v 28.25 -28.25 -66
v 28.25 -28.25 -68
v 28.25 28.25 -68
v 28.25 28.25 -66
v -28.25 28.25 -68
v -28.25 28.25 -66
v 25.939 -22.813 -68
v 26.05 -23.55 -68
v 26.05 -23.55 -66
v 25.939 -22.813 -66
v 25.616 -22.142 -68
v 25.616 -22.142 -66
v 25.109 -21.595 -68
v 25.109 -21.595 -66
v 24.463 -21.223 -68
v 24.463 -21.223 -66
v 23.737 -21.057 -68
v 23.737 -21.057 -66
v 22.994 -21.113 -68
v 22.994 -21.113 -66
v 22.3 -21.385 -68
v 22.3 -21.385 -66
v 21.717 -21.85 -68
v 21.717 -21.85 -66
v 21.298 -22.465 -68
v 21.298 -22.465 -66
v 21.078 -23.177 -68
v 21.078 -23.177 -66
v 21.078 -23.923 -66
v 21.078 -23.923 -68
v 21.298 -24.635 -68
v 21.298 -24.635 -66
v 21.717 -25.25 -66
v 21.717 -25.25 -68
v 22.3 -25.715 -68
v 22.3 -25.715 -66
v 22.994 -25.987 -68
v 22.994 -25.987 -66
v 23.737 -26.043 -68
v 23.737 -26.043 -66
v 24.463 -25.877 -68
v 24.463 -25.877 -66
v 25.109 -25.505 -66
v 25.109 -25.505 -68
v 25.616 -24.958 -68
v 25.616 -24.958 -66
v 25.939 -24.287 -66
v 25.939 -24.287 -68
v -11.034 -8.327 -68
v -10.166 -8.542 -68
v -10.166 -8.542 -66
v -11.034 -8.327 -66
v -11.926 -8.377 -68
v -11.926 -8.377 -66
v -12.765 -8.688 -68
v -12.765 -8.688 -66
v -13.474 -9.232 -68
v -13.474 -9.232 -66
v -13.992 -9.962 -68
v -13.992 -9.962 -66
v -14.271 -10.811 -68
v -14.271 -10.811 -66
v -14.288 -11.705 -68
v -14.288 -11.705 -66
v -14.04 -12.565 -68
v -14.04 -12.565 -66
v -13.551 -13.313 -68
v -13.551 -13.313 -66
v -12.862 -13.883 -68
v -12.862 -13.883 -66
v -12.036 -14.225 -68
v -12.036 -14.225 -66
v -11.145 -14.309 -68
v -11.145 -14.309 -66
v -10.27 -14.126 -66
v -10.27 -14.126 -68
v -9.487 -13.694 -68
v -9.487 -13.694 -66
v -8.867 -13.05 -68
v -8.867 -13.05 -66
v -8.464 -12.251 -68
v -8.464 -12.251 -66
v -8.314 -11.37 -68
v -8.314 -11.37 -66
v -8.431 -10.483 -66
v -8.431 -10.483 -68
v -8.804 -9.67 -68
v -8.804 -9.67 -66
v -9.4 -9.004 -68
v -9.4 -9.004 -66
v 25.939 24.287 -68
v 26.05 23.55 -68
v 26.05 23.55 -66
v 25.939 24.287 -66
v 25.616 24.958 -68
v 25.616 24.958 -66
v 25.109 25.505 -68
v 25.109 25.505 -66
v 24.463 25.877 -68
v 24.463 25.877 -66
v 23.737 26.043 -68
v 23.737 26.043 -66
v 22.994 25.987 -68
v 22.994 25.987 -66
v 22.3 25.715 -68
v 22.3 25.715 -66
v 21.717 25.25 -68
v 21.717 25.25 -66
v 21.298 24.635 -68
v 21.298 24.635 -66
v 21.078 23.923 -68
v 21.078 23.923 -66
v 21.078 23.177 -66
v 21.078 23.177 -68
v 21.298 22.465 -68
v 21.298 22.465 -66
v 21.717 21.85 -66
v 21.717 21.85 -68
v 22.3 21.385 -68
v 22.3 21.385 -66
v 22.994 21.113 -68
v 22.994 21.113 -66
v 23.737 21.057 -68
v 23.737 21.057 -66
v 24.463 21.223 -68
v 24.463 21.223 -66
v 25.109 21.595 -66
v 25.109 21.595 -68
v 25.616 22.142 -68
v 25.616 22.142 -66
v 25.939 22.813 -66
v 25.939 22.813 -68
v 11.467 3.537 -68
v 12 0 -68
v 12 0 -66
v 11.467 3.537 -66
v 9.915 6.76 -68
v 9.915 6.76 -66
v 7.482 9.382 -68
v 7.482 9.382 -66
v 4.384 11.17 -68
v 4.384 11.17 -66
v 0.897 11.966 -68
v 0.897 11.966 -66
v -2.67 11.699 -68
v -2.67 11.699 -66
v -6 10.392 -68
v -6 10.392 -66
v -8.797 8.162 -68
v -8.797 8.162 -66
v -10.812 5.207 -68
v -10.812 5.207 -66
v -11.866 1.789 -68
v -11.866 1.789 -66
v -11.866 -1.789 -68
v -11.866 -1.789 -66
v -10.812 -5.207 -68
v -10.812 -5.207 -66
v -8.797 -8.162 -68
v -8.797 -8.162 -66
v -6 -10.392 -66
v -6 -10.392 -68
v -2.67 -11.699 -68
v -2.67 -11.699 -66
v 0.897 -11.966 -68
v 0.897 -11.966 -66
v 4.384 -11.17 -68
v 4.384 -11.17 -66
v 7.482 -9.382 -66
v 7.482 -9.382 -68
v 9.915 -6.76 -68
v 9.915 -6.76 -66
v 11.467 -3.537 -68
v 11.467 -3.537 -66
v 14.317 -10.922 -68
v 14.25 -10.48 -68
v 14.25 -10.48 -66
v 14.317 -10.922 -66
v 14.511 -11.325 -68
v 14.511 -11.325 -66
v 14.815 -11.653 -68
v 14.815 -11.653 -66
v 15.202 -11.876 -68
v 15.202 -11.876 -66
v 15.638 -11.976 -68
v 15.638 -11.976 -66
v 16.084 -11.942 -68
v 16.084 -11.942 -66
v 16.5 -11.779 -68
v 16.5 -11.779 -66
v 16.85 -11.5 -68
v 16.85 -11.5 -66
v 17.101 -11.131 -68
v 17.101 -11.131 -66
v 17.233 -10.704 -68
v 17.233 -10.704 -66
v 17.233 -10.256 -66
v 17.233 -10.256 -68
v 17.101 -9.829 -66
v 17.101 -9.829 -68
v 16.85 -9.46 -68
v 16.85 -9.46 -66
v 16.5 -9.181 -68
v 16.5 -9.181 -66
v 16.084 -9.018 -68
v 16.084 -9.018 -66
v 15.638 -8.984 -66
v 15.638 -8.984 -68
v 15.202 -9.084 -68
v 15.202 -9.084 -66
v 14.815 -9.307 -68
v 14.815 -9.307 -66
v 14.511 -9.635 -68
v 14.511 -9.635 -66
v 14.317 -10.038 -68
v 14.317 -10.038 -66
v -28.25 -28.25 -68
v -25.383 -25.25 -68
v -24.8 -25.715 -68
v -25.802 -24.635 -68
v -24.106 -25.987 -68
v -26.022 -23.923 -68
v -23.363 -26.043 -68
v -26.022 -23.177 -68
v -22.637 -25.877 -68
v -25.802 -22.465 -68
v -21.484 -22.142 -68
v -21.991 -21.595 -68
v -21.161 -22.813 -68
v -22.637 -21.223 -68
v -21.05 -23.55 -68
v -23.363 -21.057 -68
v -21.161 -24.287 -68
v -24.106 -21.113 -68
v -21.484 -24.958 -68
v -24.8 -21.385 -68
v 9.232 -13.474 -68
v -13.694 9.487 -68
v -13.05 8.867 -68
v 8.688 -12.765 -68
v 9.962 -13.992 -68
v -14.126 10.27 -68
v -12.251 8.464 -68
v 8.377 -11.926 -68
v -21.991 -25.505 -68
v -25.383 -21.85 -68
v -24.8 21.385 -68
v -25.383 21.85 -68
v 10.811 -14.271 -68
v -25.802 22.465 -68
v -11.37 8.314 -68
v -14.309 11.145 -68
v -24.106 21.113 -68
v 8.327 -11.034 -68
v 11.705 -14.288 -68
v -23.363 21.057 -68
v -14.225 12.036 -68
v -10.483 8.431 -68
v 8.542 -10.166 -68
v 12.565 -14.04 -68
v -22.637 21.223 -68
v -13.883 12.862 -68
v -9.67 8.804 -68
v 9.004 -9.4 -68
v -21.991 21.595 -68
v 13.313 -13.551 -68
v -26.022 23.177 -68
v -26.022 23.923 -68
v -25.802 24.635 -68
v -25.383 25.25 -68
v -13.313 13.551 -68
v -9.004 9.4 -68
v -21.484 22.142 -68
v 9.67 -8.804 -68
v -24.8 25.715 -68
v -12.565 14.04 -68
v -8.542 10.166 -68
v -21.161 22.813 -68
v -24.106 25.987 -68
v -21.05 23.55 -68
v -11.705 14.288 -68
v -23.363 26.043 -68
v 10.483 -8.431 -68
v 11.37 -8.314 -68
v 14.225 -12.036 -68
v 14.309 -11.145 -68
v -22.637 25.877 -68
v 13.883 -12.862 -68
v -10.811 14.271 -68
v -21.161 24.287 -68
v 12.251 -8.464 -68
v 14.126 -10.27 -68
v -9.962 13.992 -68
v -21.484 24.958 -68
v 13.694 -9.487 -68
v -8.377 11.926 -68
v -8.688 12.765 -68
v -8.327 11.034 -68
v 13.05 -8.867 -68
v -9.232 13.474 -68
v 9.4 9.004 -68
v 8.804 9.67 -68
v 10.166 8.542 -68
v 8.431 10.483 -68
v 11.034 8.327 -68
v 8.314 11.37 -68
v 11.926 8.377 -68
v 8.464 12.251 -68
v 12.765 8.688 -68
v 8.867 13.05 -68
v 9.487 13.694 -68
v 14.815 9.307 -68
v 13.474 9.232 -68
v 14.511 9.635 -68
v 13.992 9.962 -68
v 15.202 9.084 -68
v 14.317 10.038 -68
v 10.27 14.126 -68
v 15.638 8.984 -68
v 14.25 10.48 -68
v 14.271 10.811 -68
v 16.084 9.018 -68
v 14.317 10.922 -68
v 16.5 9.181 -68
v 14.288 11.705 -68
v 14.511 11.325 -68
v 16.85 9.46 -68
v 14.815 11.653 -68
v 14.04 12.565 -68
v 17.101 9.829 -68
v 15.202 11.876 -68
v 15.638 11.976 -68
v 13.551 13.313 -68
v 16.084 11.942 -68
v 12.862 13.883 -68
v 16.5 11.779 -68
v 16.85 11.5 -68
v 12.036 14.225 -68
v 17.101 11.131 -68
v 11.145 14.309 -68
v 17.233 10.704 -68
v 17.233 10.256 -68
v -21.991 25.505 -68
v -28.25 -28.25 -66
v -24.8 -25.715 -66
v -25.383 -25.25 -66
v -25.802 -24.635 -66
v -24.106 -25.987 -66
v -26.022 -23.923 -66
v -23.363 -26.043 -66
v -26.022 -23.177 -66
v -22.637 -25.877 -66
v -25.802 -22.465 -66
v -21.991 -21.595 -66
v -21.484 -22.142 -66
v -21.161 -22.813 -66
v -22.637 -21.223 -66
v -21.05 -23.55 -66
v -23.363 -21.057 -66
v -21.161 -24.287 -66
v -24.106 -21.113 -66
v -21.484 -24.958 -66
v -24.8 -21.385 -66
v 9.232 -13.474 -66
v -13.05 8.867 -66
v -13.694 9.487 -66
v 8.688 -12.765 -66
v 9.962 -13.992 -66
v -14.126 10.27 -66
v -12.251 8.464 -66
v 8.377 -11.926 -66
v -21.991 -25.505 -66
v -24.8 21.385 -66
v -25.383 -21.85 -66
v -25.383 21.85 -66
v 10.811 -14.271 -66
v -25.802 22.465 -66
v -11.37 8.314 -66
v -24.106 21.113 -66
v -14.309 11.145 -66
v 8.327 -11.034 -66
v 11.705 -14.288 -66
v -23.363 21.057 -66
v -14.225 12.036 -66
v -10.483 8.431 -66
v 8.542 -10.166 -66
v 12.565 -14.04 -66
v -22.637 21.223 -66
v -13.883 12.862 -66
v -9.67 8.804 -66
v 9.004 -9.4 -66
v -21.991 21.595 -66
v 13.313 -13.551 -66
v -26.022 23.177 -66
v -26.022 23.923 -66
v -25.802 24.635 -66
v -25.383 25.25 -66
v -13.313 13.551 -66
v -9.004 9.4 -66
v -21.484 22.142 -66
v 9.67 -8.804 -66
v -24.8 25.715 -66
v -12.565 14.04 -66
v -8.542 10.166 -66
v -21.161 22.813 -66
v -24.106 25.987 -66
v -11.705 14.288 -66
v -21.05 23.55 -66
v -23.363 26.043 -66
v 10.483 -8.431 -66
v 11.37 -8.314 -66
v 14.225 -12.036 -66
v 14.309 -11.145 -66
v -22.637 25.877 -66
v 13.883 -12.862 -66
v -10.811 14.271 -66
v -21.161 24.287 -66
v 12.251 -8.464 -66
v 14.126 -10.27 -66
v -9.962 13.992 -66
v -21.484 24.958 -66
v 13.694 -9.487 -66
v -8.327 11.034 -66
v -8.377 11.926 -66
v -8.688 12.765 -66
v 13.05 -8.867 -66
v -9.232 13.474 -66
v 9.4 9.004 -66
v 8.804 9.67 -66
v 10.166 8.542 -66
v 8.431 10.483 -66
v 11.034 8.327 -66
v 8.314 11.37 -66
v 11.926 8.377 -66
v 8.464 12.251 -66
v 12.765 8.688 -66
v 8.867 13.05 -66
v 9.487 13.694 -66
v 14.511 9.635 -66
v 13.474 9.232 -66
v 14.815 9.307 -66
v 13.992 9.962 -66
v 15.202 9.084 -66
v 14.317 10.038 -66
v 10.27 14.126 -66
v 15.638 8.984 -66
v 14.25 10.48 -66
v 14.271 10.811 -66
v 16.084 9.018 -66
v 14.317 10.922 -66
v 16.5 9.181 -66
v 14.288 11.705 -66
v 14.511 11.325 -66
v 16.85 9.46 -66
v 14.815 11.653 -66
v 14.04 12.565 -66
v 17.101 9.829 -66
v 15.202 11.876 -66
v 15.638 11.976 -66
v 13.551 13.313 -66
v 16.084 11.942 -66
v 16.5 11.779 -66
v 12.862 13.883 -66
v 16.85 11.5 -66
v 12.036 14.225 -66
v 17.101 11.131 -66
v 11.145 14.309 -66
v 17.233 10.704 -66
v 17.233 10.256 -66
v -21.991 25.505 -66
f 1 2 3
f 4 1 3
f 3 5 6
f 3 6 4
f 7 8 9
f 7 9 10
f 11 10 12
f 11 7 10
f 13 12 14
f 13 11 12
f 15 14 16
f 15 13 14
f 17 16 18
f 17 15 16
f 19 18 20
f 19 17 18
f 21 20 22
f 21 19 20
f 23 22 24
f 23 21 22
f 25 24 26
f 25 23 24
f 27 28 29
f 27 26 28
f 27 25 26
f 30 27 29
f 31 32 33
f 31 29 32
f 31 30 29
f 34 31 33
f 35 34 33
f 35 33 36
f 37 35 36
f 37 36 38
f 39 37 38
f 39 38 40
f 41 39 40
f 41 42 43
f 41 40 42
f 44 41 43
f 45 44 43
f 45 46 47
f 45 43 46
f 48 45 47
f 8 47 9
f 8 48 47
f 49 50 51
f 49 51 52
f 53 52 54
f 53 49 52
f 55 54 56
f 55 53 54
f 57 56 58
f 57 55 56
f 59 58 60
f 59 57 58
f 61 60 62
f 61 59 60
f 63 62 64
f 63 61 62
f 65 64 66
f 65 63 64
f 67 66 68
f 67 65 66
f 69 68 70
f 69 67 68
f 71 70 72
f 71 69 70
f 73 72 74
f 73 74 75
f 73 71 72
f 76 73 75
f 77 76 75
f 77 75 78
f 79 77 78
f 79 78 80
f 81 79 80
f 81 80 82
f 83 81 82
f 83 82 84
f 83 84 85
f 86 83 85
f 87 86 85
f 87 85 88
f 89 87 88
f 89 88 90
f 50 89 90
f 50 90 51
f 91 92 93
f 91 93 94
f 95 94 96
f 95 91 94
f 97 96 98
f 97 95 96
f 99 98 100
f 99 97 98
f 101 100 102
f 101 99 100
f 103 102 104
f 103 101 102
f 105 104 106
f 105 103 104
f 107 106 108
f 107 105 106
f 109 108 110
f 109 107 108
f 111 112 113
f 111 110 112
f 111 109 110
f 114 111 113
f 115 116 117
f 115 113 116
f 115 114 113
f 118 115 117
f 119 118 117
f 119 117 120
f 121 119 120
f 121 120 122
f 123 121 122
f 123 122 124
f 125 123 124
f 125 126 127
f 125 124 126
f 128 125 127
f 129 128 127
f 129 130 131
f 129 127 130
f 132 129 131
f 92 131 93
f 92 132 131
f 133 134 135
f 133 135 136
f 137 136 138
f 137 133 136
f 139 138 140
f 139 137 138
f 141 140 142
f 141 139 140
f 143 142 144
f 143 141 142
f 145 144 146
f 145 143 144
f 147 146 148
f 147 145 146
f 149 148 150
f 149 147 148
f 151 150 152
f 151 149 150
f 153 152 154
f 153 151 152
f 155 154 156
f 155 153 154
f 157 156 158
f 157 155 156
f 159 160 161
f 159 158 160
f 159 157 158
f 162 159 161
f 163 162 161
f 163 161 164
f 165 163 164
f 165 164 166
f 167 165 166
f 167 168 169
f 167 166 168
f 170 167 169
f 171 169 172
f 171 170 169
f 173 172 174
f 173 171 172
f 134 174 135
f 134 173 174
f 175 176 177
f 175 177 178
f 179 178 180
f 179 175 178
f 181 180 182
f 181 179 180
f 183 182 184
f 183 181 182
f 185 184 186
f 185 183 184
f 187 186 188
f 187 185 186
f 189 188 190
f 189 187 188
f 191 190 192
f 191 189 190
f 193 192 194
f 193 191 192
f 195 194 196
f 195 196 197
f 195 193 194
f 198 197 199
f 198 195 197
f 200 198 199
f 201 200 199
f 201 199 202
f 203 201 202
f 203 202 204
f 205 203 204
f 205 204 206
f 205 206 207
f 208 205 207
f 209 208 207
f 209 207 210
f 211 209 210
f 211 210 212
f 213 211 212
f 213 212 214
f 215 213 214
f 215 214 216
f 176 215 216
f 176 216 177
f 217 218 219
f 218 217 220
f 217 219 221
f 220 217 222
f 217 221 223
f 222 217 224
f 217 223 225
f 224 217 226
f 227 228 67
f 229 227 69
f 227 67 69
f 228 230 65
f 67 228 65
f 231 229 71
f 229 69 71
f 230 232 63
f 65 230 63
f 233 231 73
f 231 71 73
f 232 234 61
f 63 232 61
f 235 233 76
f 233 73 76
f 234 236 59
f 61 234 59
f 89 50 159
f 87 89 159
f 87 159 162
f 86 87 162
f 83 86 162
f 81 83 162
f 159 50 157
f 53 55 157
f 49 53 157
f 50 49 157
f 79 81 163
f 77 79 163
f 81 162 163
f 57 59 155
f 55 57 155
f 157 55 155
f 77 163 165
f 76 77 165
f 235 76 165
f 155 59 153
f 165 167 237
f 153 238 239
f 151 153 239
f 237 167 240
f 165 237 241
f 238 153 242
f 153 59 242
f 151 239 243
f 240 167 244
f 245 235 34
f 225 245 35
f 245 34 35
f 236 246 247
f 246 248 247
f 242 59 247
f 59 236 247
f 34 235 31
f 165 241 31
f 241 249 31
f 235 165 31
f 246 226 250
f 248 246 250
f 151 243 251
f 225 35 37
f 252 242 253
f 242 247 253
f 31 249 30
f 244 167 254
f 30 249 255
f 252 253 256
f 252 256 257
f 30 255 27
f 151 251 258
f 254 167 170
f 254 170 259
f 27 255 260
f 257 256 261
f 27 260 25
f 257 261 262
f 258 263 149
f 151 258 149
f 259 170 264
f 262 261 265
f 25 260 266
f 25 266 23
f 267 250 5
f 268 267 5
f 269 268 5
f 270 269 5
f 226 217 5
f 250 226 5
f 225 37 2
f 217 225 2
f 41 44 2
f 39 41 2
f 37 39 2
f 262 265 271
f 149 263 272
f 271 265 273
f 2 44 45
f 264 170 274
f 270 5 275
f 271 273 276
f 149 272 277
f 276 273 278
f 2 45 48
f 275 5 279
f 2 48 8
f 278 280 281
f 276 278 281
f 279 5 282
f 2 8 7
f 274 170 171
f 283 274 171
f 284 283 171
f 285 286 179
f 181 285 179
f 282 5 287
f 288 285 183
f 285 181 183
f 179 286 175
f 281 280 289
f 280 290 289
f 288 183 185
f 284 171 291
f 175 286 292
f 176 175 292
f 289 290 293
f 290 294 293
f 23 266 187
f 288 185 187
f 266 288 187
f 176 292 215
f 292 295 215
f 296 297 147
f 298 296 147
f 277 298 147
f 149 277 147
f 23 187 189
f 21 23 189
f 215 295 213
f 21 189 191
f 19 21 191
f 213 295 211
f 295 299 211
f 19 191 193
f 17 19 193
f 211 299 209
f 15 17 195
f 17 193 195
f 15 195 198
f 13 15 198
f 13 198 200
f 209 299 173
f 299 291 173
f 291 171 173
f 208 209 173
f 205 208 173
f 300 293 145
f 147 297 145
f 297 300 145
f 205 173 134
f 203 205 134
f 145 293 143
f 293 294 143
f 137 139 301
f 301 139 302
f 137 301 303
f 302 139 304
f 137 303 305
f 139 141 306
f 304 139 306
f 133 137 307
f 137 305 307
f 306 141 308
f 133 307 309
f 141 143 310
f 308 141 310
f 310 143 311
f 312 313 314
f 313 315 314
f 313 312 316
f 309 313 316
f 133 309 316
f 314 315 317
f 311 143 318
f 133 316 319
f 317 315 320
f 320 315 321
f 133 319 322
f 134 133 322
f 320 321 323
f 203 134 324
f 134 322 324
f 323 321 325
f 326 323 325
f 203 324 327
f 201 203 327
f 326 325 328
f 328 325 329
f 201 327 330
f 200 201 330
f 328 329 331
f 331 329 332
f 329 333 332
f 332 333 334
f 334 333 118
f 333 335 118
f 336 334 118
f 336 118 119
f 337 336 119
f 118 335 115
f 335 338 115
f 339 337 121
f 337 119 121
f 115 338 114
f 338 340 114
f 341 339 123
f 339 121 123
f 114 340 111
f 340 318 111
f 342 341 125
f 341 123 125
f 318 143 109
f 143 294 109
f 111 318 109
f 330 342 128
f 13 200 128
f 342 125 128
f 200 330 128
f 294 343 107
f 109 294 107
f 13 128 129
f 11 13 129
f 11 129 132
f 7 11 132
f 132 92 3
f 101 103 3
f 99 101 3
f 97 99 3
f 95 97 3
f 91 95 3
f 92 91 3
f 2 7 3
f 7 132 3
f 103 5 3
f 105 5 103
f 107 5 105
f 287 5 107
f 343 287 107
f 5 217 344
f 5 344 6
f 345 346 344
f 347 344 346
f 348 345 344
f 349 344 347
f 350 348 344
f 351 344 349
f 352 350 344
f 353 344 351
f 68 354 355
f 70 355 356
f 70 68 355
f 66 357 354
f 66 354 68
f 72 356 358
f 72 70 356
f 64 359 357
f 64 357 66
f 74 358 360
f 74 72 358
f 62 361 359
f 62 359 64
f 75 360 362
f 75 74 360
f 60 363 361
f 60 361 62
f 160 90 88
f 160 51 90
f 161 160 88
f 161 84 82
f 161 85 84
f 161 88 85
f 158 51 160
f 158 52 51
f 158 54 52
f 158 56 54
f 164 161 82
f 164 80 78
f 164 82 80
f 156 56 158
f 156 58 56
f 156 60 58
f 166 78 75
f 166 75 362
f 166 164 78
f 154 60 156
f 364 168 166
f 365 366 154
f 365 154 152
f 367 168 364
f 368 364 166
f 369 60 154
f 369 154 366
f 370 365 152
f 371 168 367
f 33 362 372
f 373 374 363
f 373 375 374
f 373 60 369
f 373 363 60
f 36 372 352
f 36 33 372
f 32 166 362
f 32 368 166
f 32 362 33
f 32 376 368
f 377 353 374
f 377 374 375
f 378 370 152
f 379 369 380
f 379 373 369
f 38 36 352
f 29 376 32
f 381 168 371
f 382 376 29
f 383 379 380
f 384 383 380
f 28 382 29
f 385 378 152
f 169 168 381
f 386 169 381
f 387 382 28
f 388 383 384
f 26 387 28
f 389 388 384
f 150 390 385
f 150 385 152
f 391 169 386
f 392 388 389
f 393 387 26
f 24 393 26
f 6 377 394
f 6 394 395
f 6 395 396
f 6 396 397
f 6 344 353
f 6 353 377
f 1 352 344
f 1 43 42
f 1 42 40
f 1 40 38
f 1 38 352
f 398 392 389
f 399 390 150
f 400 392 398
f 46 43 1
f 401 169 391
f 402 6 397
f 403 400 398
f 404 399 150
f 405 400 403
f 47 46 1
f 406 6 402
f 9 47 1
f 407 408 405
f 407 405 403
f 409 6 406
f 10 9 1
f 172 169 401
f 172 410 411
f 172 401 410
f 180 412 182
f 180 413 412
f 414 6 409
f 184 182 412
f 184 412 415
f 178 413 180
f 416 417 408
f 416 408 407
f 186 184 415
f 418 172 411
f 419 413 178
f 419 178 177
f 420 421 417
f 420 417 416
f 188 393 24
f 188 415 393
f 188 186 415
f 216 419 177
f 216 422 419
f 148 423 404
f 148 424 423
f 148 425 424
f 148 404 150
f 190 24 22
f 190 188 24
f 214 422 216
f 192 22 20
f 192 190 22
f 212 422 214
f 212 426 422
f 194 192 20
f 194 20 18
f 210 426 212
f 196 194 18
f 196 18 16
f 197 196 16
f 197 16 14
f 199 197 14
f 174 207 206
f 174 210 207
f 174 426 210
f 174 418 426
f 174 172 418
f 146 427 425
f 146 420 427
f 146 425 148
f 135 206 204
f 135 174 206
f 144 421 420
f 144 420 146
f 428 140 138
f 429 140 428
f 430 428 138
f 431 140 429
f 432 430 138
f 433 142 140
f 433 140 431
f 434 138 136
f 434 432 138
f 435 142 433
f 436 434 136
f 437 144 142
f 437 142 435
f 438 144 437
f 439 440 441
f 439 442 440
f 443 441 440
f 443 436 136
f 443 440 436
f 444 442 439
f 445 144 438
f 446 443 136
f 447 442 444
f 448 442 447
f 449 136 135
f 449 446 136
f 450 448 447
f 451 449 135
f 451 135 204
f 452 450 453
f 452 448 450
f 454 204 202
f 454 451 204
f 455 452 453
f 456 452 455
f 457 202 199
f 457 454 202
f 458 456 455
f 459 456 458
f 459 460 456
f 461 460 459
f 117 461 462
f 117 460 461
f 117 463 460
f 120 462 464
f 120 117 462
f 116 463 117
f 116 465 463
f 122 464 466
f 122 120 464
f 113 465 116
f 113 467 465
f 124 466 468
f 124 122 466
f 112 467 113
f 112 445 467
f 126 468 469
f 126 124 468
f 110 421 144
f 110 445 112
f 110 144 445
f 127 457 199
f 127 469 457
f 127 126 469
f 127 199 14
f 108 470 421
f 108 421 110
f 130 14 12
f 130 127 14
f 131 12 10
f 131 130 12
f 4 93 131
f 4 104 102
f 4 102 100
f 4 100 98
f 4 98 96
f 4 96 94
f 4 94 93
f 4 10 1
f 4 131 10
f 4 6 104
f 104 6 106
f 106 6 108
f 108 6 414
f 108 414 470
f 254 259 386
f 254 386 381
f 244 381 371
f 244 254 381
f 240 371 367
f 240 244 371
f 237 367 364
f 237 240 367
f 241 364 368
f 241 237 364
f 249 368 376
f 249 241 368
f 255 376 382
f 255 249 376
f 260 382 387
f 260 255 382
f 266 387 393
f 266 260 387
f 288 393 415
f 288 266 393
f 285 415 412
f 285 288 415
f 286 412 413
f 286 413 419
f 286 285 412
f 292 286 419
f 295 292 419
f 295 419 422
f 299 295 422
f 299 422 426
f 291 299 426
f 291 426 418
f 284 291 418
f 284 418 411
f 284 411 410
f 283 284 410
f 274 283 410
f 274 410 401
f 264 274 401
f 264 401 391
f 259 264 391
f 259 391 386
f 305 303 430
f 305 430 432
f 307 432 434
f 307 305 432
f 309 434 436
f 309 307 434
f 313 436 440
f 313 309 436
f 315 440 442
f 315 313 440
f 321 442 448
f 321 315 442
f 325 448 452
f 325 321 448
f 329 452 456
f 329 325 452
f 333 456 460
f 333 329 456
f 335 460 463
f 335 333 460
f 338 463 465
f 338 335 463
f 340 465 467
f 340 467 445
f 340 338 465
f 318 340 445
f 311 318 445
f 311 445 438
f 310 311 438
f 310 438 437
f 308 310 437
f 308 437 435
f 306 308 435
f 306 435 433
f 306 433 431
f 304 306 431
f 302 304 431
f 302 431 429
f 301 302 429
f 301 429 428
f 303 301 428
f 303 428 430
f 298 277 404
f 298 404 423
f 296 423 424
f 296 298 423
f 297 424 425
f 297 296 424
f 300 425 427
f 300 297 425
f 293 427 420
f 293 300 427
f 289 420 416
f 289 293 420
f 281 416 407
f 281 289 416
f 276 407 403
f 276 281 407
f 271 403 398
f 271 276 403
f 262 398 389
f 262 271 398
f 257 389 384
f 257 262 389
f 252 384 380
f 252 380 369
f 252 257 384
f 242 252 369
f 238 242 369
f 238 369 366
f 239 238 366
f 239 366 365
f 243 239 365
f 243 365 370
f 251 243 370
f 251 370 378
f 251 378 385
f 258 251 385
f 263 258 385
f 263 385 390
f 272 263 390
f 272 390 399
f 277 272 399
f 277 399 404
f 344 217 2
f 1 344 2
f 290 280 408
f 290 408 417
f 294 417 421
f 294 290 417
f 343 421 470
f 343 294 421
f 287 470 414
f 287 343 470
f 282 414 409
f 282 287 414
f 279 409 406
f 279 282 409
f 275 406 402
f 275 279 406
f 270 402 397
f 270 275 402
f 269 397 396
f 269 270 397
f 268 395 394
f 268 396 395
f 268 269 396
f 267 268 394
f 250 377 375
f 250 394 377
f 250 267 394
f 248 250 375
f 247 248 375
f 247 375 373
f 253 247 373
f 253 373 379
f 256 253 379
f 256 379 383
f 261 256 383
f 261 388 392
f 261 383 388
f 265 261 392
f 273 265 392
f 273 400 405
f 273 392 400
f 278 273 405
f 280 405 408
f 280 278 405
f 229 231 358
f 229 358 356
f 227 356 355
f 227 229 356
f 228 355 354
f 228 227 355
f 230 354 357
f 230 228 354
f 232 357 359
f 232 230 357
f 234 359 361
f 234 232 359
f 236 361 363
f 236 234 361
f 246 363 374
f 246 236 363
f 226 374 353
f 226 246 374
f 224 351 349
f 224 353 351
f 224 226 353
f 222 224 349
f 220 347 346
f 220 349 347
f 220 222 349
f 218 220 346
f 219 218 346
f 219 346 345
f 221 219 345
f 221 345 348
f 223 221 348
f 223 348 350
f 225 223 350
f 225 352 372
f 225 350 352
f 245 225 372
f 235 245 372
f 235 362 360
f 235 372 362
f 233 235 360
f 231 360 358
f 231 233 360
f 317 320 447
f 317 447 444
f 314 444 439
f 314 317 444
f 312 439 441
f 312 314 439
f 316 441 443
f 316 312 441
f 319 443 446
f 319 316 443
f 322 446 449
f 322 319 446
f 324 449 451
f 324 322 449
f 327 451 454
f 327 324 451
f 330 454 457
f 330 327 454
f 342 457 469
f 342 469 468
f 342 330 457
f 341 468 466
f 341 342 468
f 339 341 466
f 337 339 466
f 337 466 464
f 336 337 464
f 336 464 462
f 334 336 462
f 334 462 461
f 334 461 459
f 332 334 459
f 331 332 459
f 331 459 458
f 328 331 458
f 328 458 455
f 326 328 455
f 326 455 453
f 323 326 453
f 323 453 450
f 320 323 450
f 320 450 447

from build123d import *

# Parameters (mm, degrees)
BOX268_W                    = 56.5
BOX268_H                    = 56.5
BOX268_DEPTH                = 2
CYLINDER687_R               = 1.5
CYLINDER687_DEPTH           = 20
CYLINDER686_R               = 1.5
CYLINDER686_DEPTH           = 20
COMPOUND411_PLACEMENT_ANGLE = 90
BOX266_W                    = 20
BOX266_H                    = 8
BOX266_DEPTH                = 3
BOX265_W                    = 20
BOX265_H                    = 8
BOX265_DEPTH                = 3
BOX267_W                    = 20
BOX267_H                    = 8
BOX267_DEPTH                = 3
BOX264_W                    = 20
BOX264_H                    = 8
BOX264_DEPTH                = 3
CYLINDER682_R               = 12
CYLINDER682_DEPTH           = 20
CYLINDER672_R               = 5
CYLINDER672_DEPTH           = 4
CYLINDER670_R               = 5
CYLINDER670_DEPTH           = 4
CYLINDER674_R               = 5
CYLINDER674_DEPTH           = 4
CYLINDER675_R               = 5
CYLINDER675_DEPTH           = 4
CYLINDER683_R               = 2.5
CYLINDER683_DEPTH           = 20
CYLINDER673_R               = 2.5
CYLINDER673_DEPTH           = 20
CYLINDER676_R               = 2.5
CYLINDER676_DEPTH           = 20
CYLINDER684_R               = 2.5
CYLINDER684_DEPTH           = 20
CYLINDER681_R               = 3
CYLINDER681_DEPTH           = 5
CYLINDER681_PLACEMENT_ANGLE = 22.5
CYLINDER669_R               = 3
CYLINDER669_DEPTH           = 5
CYLINDER669_PLACEMENT_ANGLE = 67.5
CYLINDER680_R               = 3
CYLINDER680_DEPTH           = 5
CYLINDER680_PLACEMENT_ANGLE = 202.5
CYLINDER677_R               = 3
CYLINDER677_DEPTH           = 5
CYLINDER677_PLACEMENT_ANGLE = 112.5
COMPOUND408_PLACEMENT_ANGLE = 45
CYLINDER679_R               = 1.5
CYLINDER679_DEPTH           = 30
CYLINDER679_PLACEMENT_ANGLE = 22.5
CYLINDER678_R               = 1.5
CYLINDER678_DEPTH           = 30
CYLINDER678_PLACEMENT_ANGLE = 67.5
CYLINDER685_R               = 1.5
CYLINDER685_DEPTH           = 30
CYLINDER685_PLACEMENT_ANGLE = 202.5
CYLINDER671_R               = 1.5
CYLINDER671_DEPTH           = 30
CYLINDER671_PLACEMENT_ANGLE = 112.5
COMPOUND409_PLACEMENT_ANGLE = 45
BOX263_W                    = 68
BOX263_H                    = 64
BOX263_DEPTH                = 8


with BuildPart() as krychle268:
    # Box268 → Box268 (new body)
    with BuildSketch(Plane(origin=(-28.25, -28.25, -68), x_dir=(1, 0, 0), z_dir=(0, 0, 1))):
        with Locations((28.25, 28.25)):
            Rectangle(BOX268_W, BOX268_H)
    extrude(amount=BOX268_DEPTH)


with BuildPart() as v_lec687:
    # Cylinder687 → Cylinder687 (new body)
    with BuildSketch(Plane(origin=(15.75, 114, 59.48), x_dir=(-1, 0, 0), z_dir=(0, 1, 0))):
        Circle(CYLINDER687_R)
    extrude(amount=CYLINDER687_DEPTH)


with BuildPart() as compound411:
    # Cylinder686 → Cylinder686 (new body)
    with BuildSketch(Plane(origin=(15.75, 114, 38.52), x_dir=(-1, 0, 0), z_dir=(0, 1, 0))):
        Circle(CYLINDER686_R)
    extrude(amount=CYLINDER686_DEPTH)

    # Compound411: union Válec687
    add(v_lec687.part)


with BuildPart() as compound411_1:
    # Compound411 placement: moved
    add(compound411.part.moved(Location((0, 49, -200))).rotate(Axis((0, 49, -200), (1, 0, 0)), COMPOUND411_PLACEMENT_ANGLE))


with BuildPart() as krychle266:
    # Box266 → Box266 (new body)
    with BuildSketch(Plane(origin=(17.55, -27.55, 31), x_dir=(1, 0, 0), z_dir=(0, 0, 1))):
        with Locations((10, 4)):
            Rectangle(BOX266_W, BOX266_H)
    extrude(amount=BOX266_DEPTH)


with BuildPart() as krychle265:
    # Box265 → Box265 (new body)
    with BuildSketch(Plane(origin=(-37.45, 19.55, 31), x_dir=(1, 0, 0), z_dir=(0, 0, 1))):
        with Locations((10, 4)):
            Rectangle(BOX265_W, BOX265_H)
    extrude(amount=BOX265_DEPTH)


with BuildPart() as krychle267:
    # Box267 → Box267 (new body)
    with BuildSketch(Plane(origin=(-37.45, -27.55, 31), x_dir=(1, 0, 0), z_dir=(0, 0, 1))):
        with Locations((10, 4)):
            Rectangle(BOX267_W, BOX267_H)
    extrude(amount=BOX267_DEPTH)


with BuildPart() as compound410:
    # Box264 → Box264 (new body)
    with BuildSketch(Plane(origin=(17.55, 19.55, 31), x_dir=(1, 0, 0), z_dir=(0, 0, 1))):
        with Locations((10, 4)):
            Rectangle(BOX264_W, BOX264_H)
    extrude(amount=BOX264_DEPTH)

    # Compound410: union Krychle266, Krychle265, Krychle267
    add(krychle266.part)
    add(krychle265.part)
    add(krychle267.part)


with BuildPart() as compound410_1:
    # Compound410 placement: moved
    add(compound410.part.moved(Location((0, 0, -4))))


with BuildPart() as v_lec682:
    # Cylinder682 → Cylinder682 (new body)
    with BuildSketch(Plane.XY.offset(15)):
        Circle(CYLINDER682_R)
    extrude(amount=CYLINDER682_DEPTH)


with BuildPart() as v_lec672:
    # Cylinder672 → Cylinder672 (new body)
    with BuildSketch(Plane(origin=(23.55, 23.55, 26), x_dir=(1, 0, 0), z_dir=(0, 0, 1))):
        Circle(CYLINDER672_R)
    extrude(amount=CYLINDER672_DEPTH)


with BuildPart() as v_lec670:
    # Cylinder670 → Cylinder670 (new body)
    with BuildSketch(Plane(origin=(23.55, -23.55, 26), x_dir=(1, 0, 0), z_dir=(0, 0, 1))):
        Circle(CYLINDER670_R)
    extrude(amount=CYLINDER670_DEPTH)


with BuildPart() as v_lec674:
    # Cylinder674 → Cylinder674 (new body)
    with BuildSketch(Plane(origin=(-23.55, 23.55, 26), x_dir=(1, 0, 0), z_dir=(0, 0, 1))):
        Circle(CYLINDER674_R)
    extrude(amount=CYLINDER674_DEPTH)


with BuildPart() as compound406:
    # Cylinder675 → Cylinder675 (new body)
    with BuildSketch(Plane(origin=(-23.55, -23.55, 26), x_dir=(1, 0, 0), z_dir=(0, 0, 1))):
        Circle(CYLINDER675_R)
    extrude(amount=CYLINDER675_DEPTH)

    # Compound406: union Válec672, Válec670, Válec674
    add(v_lec672.part)
    add(v_lec670.part)
    add(v_lec674.part)


with BuildPart() as compound406_1:
    # Compound406 placement: moved
    add(compound406.part.moved(Location((0, 0, -50))))


with BuildPart() as v_lec683:
    # Cylinder683 → Cylinder683 (new body)
    with BuildSketch(Plane(origin=(-23.55, 23.55, 20), x_dir=(1, 0, 0), z_dir=(0, 0, 1))):
        Circle(CYLINDER683_R)
    extrude(amount=CYLINDER683_DEPTH)


with BuildPart() as v_lec673:
    # Cylinder673 → Cylinder673 (new body)
    with BuildSketch(Plane(origin=(-23.55, -23.55, 20), x_dir=(1, 0, 0), z_dir=(0, 0, 1))):
        Circle(CYLINDER673_R)
    extrude(amount=CYLINDER673_DEPTH)


with BuildPart() as v_lec676:
    # Cylinder676 → Cylinder676 (new body)
    with BuildSketch(Plane(origin=(23.55, -23.55, 20), x_dir=(1, 0, 0), z_dir=(0, 0, 1))):
        Circle(CYLINDER676_R)
    extrude(amount=CYLINDER676_DEPTH)


with BuildPart() as compound407:
    # Cylinder684 → Cylinder684 (new body)
    with BuildSketch(Plane(origin=(23.55, 23.55, 20), x_dir=(1, 0, 0), z_dir=(0, 0, 1))):
        Circle(CYLINDER684_R)
    extrude(amount=CYLINDER684_DEPTH)

    # Compound407: union Válec683, Válec673, Válec676
    add(v_lec683.part)
    add(v_lec673.part)
    add(v_lec676.part)


with BuildPart() as v_lec681:
    # Cylinder681 → Cylinder681 (new body)
    with BuildSketch(Plane.XY):
        Circle(CYLINDER681_R)
    extrude(amount=CYLINDER681_DEPTH)


with BuildPart() as v_lec681_1:
    # Cylinder681 placement: moved
    add(v_lec681.part.moved(Location((-16, 0, 2))).rotate(Axis((-16, 0, 2), (0, 0, 1)), CYLINDER681_PLACEMENT_ANGLE))


with BuildPart() as v_lec669:
    # Cylinder669 → Cylinder669 (new body)
    with BuildSketch(Plane.XY):
        Circle(CYLINDER669_R)
    extrude(amount=CYLINDER669_DEPTH)


with BuildPart() as v_lec669_1:
    # Cylinder669 placement: moved
    add(v_lec669.part.moved(Location((0, 16, 2))).rotate(Axis((0, 16, 2), (0, 0, -1)), CYLINDER669_PLACEMENT_ANGLE))


with BuildPart() as v_lec680:
    # Cylinder680 → Cylinder680 (new body)
    with BuildSketch(Plane.XY):
        Circle(CYLINDER680_R)
    extrude(amount=CYLINDER680_DEPTH)


with BuildPart() as v_lec680_1:
    # Cylinder680 placement: moved
    add(v_lec680.part.moved(Location((16, 0, 2))).rotate(Axis((16, 0, 2), (0, 0, 1)), CYLINDER680_PLACEMENT_ANGLE))


with BuildPart() as compound408:
    # Cylinder677 → Cylinder677 (new body)
    with BuildSketch(Plane.XY):
        Circle(CYLINDER677_R)
    extrude(amount=CYLINDER677_DEPTH)


with BuildPart() as compound408_1:
    # Cylinder677 placement: moved
    add(compound408.part.moved(Location((0, -16, 2))).rotate(Axis((0, -16, 2), (0, 0, 1)), CYLINDER677_PLACEMENT_ANGLE))

    # Compound408: union Válec681, Válec669, Válec680
    add(v_lec681_1.part)
    add(v_lec669_1.part)
    add(v_lec680_1.part)


with BuildPart() as compound408_2:
    # Compound408 placement: moved
    add(compound408_1.part.moved(Location((0, 0, 27))).rotate(Axis((0, 0, 27), (0, 0, 1)), COMPOUND408_PLACEMENT_ANGLE))


with BuildPart() as v_lec679:
    # Cylinder679 → Cylinder679 (new body)
    with BuildSketch(Plane.XY):
        Circle(CYLINDER679_R)
    extrude(amount=CYLINDER679_DEPTH)


with BuildPart() as v_lec679_1:
    # Cylinder679 placement: moved
    add(v_lec679.part.moved(Location((-16, 0, 2))).rotate(Axis((-16, 0, 2), (0, 0, 1)), CYLINDER679_PLACEMENT_ANGLE))


with BuildPart() as v_lec678:
    # Cylinder678 → Cylinder678 (new body)
    with BuildSketch(Plane.XY):
        Circle(CYLINDER678_R)
    extrude(amount=CYLINDER678_DEPTH)


with BuildPart() as v_lec678_1:
    # Cylinder678 placement: moved
    add(v_lec678.part.moved(Location((0, 16, 2))).rotate(Axis((0, 16, 2), (0, 0, -1)), CYLINDER678_PLACEMENT_ANGLE))


with BuildPart() as v_lec685:
    # Cylinder685 → Cylinder685 (new body)
    with BuildSketch(Plane.XY):
        Circle(CYLINDER685_R)
    extrude(amount=CYLINDER685_DEPTH)


with BuildPart() as v_lec685_1:
    # Cylinder685 placement: moved
    add(v_lec685.part.moved(Location((16, 0, 2))).rotate(Axis((16, 0, 2), (0, 0, 1)), CYLINDER685_PLACEMENT_ANGLE))


with BuildPart() as compound409:
    # Cylinder671 → Cylinder671 (new body)
    with BuildSketch(Plane.XY):
        Circle(CYLINDER671_R)
    extrude(amount=CYLINDER671_DEPTH)


with BuildPart() as compound409_1:
    # Cylinder671 placement: moved
    add(compound409.part.moved(Location((0, -16, 2))).rotate(Axis((0, -16, 2), (0, 0, 1)), CYLINDER671_PLACEMENT_ANGLE))

    # Compound409: union Válec679, Válec678, Válec685
    add(v_lec679_1.part)
    add(v_lec678_1.part)
    add(v_lec685_1.part)


with BuildPart() as compound409_2:
    # Compound409 placement: moved
    add(compound409_1.part.moved(Location((0, 0, 14))).rotate(Axis((0, 0, 14), (0, 0, 1)), COMPOUND409_PLACEMENT_ANGLE))


with BuildPart() as common001:
    # Box263 → Box263 (new body)
    with BuildSketch(Plane(origin=(-34, -32, 26), x_dir=(1, 0, 0), z_dir=(0, 0, 1))):
        with Locations((34, 32)):
            Rectangle(BOX263_W, BOX263_H)
    extrude(amount=BOX263_DEPTH)

    # Cut271: cut Compound409
    add(compound409_2.part, mode=Mode.SUBTRACT)

    # Cut270: cut Compound408
    add(compound408_2.part, mode=Mode.SUBTRACT)

    # Cut272: cut Compound407
    add(compound407.part, mode=Mode.SUBTRACT)

    # Cut269: cut Compound406
    add(compound406_1.part, mode=Mode.SUBTRACT)

    # Cut268: cut Válec682
    add(v_lec682.part, mode=Mode.SUBTRACT)

    # Cut267: cut Compound410
    add(compound410_1.part, mode=Mode.SUBTRACT)


with BuildPart() as common001_1:
    # Cut267 placement: moved
    add(common001.part.moved(Location((0, 0, -100))))

    # Cut: cut Compound411
    add(compound411_1.part, mode=Mode.SUBTRACT)

    # Common001: intersect Krychle268
    add(krychle268.part, mode=Mode.INTERSECT)


solid = common001_1.part
